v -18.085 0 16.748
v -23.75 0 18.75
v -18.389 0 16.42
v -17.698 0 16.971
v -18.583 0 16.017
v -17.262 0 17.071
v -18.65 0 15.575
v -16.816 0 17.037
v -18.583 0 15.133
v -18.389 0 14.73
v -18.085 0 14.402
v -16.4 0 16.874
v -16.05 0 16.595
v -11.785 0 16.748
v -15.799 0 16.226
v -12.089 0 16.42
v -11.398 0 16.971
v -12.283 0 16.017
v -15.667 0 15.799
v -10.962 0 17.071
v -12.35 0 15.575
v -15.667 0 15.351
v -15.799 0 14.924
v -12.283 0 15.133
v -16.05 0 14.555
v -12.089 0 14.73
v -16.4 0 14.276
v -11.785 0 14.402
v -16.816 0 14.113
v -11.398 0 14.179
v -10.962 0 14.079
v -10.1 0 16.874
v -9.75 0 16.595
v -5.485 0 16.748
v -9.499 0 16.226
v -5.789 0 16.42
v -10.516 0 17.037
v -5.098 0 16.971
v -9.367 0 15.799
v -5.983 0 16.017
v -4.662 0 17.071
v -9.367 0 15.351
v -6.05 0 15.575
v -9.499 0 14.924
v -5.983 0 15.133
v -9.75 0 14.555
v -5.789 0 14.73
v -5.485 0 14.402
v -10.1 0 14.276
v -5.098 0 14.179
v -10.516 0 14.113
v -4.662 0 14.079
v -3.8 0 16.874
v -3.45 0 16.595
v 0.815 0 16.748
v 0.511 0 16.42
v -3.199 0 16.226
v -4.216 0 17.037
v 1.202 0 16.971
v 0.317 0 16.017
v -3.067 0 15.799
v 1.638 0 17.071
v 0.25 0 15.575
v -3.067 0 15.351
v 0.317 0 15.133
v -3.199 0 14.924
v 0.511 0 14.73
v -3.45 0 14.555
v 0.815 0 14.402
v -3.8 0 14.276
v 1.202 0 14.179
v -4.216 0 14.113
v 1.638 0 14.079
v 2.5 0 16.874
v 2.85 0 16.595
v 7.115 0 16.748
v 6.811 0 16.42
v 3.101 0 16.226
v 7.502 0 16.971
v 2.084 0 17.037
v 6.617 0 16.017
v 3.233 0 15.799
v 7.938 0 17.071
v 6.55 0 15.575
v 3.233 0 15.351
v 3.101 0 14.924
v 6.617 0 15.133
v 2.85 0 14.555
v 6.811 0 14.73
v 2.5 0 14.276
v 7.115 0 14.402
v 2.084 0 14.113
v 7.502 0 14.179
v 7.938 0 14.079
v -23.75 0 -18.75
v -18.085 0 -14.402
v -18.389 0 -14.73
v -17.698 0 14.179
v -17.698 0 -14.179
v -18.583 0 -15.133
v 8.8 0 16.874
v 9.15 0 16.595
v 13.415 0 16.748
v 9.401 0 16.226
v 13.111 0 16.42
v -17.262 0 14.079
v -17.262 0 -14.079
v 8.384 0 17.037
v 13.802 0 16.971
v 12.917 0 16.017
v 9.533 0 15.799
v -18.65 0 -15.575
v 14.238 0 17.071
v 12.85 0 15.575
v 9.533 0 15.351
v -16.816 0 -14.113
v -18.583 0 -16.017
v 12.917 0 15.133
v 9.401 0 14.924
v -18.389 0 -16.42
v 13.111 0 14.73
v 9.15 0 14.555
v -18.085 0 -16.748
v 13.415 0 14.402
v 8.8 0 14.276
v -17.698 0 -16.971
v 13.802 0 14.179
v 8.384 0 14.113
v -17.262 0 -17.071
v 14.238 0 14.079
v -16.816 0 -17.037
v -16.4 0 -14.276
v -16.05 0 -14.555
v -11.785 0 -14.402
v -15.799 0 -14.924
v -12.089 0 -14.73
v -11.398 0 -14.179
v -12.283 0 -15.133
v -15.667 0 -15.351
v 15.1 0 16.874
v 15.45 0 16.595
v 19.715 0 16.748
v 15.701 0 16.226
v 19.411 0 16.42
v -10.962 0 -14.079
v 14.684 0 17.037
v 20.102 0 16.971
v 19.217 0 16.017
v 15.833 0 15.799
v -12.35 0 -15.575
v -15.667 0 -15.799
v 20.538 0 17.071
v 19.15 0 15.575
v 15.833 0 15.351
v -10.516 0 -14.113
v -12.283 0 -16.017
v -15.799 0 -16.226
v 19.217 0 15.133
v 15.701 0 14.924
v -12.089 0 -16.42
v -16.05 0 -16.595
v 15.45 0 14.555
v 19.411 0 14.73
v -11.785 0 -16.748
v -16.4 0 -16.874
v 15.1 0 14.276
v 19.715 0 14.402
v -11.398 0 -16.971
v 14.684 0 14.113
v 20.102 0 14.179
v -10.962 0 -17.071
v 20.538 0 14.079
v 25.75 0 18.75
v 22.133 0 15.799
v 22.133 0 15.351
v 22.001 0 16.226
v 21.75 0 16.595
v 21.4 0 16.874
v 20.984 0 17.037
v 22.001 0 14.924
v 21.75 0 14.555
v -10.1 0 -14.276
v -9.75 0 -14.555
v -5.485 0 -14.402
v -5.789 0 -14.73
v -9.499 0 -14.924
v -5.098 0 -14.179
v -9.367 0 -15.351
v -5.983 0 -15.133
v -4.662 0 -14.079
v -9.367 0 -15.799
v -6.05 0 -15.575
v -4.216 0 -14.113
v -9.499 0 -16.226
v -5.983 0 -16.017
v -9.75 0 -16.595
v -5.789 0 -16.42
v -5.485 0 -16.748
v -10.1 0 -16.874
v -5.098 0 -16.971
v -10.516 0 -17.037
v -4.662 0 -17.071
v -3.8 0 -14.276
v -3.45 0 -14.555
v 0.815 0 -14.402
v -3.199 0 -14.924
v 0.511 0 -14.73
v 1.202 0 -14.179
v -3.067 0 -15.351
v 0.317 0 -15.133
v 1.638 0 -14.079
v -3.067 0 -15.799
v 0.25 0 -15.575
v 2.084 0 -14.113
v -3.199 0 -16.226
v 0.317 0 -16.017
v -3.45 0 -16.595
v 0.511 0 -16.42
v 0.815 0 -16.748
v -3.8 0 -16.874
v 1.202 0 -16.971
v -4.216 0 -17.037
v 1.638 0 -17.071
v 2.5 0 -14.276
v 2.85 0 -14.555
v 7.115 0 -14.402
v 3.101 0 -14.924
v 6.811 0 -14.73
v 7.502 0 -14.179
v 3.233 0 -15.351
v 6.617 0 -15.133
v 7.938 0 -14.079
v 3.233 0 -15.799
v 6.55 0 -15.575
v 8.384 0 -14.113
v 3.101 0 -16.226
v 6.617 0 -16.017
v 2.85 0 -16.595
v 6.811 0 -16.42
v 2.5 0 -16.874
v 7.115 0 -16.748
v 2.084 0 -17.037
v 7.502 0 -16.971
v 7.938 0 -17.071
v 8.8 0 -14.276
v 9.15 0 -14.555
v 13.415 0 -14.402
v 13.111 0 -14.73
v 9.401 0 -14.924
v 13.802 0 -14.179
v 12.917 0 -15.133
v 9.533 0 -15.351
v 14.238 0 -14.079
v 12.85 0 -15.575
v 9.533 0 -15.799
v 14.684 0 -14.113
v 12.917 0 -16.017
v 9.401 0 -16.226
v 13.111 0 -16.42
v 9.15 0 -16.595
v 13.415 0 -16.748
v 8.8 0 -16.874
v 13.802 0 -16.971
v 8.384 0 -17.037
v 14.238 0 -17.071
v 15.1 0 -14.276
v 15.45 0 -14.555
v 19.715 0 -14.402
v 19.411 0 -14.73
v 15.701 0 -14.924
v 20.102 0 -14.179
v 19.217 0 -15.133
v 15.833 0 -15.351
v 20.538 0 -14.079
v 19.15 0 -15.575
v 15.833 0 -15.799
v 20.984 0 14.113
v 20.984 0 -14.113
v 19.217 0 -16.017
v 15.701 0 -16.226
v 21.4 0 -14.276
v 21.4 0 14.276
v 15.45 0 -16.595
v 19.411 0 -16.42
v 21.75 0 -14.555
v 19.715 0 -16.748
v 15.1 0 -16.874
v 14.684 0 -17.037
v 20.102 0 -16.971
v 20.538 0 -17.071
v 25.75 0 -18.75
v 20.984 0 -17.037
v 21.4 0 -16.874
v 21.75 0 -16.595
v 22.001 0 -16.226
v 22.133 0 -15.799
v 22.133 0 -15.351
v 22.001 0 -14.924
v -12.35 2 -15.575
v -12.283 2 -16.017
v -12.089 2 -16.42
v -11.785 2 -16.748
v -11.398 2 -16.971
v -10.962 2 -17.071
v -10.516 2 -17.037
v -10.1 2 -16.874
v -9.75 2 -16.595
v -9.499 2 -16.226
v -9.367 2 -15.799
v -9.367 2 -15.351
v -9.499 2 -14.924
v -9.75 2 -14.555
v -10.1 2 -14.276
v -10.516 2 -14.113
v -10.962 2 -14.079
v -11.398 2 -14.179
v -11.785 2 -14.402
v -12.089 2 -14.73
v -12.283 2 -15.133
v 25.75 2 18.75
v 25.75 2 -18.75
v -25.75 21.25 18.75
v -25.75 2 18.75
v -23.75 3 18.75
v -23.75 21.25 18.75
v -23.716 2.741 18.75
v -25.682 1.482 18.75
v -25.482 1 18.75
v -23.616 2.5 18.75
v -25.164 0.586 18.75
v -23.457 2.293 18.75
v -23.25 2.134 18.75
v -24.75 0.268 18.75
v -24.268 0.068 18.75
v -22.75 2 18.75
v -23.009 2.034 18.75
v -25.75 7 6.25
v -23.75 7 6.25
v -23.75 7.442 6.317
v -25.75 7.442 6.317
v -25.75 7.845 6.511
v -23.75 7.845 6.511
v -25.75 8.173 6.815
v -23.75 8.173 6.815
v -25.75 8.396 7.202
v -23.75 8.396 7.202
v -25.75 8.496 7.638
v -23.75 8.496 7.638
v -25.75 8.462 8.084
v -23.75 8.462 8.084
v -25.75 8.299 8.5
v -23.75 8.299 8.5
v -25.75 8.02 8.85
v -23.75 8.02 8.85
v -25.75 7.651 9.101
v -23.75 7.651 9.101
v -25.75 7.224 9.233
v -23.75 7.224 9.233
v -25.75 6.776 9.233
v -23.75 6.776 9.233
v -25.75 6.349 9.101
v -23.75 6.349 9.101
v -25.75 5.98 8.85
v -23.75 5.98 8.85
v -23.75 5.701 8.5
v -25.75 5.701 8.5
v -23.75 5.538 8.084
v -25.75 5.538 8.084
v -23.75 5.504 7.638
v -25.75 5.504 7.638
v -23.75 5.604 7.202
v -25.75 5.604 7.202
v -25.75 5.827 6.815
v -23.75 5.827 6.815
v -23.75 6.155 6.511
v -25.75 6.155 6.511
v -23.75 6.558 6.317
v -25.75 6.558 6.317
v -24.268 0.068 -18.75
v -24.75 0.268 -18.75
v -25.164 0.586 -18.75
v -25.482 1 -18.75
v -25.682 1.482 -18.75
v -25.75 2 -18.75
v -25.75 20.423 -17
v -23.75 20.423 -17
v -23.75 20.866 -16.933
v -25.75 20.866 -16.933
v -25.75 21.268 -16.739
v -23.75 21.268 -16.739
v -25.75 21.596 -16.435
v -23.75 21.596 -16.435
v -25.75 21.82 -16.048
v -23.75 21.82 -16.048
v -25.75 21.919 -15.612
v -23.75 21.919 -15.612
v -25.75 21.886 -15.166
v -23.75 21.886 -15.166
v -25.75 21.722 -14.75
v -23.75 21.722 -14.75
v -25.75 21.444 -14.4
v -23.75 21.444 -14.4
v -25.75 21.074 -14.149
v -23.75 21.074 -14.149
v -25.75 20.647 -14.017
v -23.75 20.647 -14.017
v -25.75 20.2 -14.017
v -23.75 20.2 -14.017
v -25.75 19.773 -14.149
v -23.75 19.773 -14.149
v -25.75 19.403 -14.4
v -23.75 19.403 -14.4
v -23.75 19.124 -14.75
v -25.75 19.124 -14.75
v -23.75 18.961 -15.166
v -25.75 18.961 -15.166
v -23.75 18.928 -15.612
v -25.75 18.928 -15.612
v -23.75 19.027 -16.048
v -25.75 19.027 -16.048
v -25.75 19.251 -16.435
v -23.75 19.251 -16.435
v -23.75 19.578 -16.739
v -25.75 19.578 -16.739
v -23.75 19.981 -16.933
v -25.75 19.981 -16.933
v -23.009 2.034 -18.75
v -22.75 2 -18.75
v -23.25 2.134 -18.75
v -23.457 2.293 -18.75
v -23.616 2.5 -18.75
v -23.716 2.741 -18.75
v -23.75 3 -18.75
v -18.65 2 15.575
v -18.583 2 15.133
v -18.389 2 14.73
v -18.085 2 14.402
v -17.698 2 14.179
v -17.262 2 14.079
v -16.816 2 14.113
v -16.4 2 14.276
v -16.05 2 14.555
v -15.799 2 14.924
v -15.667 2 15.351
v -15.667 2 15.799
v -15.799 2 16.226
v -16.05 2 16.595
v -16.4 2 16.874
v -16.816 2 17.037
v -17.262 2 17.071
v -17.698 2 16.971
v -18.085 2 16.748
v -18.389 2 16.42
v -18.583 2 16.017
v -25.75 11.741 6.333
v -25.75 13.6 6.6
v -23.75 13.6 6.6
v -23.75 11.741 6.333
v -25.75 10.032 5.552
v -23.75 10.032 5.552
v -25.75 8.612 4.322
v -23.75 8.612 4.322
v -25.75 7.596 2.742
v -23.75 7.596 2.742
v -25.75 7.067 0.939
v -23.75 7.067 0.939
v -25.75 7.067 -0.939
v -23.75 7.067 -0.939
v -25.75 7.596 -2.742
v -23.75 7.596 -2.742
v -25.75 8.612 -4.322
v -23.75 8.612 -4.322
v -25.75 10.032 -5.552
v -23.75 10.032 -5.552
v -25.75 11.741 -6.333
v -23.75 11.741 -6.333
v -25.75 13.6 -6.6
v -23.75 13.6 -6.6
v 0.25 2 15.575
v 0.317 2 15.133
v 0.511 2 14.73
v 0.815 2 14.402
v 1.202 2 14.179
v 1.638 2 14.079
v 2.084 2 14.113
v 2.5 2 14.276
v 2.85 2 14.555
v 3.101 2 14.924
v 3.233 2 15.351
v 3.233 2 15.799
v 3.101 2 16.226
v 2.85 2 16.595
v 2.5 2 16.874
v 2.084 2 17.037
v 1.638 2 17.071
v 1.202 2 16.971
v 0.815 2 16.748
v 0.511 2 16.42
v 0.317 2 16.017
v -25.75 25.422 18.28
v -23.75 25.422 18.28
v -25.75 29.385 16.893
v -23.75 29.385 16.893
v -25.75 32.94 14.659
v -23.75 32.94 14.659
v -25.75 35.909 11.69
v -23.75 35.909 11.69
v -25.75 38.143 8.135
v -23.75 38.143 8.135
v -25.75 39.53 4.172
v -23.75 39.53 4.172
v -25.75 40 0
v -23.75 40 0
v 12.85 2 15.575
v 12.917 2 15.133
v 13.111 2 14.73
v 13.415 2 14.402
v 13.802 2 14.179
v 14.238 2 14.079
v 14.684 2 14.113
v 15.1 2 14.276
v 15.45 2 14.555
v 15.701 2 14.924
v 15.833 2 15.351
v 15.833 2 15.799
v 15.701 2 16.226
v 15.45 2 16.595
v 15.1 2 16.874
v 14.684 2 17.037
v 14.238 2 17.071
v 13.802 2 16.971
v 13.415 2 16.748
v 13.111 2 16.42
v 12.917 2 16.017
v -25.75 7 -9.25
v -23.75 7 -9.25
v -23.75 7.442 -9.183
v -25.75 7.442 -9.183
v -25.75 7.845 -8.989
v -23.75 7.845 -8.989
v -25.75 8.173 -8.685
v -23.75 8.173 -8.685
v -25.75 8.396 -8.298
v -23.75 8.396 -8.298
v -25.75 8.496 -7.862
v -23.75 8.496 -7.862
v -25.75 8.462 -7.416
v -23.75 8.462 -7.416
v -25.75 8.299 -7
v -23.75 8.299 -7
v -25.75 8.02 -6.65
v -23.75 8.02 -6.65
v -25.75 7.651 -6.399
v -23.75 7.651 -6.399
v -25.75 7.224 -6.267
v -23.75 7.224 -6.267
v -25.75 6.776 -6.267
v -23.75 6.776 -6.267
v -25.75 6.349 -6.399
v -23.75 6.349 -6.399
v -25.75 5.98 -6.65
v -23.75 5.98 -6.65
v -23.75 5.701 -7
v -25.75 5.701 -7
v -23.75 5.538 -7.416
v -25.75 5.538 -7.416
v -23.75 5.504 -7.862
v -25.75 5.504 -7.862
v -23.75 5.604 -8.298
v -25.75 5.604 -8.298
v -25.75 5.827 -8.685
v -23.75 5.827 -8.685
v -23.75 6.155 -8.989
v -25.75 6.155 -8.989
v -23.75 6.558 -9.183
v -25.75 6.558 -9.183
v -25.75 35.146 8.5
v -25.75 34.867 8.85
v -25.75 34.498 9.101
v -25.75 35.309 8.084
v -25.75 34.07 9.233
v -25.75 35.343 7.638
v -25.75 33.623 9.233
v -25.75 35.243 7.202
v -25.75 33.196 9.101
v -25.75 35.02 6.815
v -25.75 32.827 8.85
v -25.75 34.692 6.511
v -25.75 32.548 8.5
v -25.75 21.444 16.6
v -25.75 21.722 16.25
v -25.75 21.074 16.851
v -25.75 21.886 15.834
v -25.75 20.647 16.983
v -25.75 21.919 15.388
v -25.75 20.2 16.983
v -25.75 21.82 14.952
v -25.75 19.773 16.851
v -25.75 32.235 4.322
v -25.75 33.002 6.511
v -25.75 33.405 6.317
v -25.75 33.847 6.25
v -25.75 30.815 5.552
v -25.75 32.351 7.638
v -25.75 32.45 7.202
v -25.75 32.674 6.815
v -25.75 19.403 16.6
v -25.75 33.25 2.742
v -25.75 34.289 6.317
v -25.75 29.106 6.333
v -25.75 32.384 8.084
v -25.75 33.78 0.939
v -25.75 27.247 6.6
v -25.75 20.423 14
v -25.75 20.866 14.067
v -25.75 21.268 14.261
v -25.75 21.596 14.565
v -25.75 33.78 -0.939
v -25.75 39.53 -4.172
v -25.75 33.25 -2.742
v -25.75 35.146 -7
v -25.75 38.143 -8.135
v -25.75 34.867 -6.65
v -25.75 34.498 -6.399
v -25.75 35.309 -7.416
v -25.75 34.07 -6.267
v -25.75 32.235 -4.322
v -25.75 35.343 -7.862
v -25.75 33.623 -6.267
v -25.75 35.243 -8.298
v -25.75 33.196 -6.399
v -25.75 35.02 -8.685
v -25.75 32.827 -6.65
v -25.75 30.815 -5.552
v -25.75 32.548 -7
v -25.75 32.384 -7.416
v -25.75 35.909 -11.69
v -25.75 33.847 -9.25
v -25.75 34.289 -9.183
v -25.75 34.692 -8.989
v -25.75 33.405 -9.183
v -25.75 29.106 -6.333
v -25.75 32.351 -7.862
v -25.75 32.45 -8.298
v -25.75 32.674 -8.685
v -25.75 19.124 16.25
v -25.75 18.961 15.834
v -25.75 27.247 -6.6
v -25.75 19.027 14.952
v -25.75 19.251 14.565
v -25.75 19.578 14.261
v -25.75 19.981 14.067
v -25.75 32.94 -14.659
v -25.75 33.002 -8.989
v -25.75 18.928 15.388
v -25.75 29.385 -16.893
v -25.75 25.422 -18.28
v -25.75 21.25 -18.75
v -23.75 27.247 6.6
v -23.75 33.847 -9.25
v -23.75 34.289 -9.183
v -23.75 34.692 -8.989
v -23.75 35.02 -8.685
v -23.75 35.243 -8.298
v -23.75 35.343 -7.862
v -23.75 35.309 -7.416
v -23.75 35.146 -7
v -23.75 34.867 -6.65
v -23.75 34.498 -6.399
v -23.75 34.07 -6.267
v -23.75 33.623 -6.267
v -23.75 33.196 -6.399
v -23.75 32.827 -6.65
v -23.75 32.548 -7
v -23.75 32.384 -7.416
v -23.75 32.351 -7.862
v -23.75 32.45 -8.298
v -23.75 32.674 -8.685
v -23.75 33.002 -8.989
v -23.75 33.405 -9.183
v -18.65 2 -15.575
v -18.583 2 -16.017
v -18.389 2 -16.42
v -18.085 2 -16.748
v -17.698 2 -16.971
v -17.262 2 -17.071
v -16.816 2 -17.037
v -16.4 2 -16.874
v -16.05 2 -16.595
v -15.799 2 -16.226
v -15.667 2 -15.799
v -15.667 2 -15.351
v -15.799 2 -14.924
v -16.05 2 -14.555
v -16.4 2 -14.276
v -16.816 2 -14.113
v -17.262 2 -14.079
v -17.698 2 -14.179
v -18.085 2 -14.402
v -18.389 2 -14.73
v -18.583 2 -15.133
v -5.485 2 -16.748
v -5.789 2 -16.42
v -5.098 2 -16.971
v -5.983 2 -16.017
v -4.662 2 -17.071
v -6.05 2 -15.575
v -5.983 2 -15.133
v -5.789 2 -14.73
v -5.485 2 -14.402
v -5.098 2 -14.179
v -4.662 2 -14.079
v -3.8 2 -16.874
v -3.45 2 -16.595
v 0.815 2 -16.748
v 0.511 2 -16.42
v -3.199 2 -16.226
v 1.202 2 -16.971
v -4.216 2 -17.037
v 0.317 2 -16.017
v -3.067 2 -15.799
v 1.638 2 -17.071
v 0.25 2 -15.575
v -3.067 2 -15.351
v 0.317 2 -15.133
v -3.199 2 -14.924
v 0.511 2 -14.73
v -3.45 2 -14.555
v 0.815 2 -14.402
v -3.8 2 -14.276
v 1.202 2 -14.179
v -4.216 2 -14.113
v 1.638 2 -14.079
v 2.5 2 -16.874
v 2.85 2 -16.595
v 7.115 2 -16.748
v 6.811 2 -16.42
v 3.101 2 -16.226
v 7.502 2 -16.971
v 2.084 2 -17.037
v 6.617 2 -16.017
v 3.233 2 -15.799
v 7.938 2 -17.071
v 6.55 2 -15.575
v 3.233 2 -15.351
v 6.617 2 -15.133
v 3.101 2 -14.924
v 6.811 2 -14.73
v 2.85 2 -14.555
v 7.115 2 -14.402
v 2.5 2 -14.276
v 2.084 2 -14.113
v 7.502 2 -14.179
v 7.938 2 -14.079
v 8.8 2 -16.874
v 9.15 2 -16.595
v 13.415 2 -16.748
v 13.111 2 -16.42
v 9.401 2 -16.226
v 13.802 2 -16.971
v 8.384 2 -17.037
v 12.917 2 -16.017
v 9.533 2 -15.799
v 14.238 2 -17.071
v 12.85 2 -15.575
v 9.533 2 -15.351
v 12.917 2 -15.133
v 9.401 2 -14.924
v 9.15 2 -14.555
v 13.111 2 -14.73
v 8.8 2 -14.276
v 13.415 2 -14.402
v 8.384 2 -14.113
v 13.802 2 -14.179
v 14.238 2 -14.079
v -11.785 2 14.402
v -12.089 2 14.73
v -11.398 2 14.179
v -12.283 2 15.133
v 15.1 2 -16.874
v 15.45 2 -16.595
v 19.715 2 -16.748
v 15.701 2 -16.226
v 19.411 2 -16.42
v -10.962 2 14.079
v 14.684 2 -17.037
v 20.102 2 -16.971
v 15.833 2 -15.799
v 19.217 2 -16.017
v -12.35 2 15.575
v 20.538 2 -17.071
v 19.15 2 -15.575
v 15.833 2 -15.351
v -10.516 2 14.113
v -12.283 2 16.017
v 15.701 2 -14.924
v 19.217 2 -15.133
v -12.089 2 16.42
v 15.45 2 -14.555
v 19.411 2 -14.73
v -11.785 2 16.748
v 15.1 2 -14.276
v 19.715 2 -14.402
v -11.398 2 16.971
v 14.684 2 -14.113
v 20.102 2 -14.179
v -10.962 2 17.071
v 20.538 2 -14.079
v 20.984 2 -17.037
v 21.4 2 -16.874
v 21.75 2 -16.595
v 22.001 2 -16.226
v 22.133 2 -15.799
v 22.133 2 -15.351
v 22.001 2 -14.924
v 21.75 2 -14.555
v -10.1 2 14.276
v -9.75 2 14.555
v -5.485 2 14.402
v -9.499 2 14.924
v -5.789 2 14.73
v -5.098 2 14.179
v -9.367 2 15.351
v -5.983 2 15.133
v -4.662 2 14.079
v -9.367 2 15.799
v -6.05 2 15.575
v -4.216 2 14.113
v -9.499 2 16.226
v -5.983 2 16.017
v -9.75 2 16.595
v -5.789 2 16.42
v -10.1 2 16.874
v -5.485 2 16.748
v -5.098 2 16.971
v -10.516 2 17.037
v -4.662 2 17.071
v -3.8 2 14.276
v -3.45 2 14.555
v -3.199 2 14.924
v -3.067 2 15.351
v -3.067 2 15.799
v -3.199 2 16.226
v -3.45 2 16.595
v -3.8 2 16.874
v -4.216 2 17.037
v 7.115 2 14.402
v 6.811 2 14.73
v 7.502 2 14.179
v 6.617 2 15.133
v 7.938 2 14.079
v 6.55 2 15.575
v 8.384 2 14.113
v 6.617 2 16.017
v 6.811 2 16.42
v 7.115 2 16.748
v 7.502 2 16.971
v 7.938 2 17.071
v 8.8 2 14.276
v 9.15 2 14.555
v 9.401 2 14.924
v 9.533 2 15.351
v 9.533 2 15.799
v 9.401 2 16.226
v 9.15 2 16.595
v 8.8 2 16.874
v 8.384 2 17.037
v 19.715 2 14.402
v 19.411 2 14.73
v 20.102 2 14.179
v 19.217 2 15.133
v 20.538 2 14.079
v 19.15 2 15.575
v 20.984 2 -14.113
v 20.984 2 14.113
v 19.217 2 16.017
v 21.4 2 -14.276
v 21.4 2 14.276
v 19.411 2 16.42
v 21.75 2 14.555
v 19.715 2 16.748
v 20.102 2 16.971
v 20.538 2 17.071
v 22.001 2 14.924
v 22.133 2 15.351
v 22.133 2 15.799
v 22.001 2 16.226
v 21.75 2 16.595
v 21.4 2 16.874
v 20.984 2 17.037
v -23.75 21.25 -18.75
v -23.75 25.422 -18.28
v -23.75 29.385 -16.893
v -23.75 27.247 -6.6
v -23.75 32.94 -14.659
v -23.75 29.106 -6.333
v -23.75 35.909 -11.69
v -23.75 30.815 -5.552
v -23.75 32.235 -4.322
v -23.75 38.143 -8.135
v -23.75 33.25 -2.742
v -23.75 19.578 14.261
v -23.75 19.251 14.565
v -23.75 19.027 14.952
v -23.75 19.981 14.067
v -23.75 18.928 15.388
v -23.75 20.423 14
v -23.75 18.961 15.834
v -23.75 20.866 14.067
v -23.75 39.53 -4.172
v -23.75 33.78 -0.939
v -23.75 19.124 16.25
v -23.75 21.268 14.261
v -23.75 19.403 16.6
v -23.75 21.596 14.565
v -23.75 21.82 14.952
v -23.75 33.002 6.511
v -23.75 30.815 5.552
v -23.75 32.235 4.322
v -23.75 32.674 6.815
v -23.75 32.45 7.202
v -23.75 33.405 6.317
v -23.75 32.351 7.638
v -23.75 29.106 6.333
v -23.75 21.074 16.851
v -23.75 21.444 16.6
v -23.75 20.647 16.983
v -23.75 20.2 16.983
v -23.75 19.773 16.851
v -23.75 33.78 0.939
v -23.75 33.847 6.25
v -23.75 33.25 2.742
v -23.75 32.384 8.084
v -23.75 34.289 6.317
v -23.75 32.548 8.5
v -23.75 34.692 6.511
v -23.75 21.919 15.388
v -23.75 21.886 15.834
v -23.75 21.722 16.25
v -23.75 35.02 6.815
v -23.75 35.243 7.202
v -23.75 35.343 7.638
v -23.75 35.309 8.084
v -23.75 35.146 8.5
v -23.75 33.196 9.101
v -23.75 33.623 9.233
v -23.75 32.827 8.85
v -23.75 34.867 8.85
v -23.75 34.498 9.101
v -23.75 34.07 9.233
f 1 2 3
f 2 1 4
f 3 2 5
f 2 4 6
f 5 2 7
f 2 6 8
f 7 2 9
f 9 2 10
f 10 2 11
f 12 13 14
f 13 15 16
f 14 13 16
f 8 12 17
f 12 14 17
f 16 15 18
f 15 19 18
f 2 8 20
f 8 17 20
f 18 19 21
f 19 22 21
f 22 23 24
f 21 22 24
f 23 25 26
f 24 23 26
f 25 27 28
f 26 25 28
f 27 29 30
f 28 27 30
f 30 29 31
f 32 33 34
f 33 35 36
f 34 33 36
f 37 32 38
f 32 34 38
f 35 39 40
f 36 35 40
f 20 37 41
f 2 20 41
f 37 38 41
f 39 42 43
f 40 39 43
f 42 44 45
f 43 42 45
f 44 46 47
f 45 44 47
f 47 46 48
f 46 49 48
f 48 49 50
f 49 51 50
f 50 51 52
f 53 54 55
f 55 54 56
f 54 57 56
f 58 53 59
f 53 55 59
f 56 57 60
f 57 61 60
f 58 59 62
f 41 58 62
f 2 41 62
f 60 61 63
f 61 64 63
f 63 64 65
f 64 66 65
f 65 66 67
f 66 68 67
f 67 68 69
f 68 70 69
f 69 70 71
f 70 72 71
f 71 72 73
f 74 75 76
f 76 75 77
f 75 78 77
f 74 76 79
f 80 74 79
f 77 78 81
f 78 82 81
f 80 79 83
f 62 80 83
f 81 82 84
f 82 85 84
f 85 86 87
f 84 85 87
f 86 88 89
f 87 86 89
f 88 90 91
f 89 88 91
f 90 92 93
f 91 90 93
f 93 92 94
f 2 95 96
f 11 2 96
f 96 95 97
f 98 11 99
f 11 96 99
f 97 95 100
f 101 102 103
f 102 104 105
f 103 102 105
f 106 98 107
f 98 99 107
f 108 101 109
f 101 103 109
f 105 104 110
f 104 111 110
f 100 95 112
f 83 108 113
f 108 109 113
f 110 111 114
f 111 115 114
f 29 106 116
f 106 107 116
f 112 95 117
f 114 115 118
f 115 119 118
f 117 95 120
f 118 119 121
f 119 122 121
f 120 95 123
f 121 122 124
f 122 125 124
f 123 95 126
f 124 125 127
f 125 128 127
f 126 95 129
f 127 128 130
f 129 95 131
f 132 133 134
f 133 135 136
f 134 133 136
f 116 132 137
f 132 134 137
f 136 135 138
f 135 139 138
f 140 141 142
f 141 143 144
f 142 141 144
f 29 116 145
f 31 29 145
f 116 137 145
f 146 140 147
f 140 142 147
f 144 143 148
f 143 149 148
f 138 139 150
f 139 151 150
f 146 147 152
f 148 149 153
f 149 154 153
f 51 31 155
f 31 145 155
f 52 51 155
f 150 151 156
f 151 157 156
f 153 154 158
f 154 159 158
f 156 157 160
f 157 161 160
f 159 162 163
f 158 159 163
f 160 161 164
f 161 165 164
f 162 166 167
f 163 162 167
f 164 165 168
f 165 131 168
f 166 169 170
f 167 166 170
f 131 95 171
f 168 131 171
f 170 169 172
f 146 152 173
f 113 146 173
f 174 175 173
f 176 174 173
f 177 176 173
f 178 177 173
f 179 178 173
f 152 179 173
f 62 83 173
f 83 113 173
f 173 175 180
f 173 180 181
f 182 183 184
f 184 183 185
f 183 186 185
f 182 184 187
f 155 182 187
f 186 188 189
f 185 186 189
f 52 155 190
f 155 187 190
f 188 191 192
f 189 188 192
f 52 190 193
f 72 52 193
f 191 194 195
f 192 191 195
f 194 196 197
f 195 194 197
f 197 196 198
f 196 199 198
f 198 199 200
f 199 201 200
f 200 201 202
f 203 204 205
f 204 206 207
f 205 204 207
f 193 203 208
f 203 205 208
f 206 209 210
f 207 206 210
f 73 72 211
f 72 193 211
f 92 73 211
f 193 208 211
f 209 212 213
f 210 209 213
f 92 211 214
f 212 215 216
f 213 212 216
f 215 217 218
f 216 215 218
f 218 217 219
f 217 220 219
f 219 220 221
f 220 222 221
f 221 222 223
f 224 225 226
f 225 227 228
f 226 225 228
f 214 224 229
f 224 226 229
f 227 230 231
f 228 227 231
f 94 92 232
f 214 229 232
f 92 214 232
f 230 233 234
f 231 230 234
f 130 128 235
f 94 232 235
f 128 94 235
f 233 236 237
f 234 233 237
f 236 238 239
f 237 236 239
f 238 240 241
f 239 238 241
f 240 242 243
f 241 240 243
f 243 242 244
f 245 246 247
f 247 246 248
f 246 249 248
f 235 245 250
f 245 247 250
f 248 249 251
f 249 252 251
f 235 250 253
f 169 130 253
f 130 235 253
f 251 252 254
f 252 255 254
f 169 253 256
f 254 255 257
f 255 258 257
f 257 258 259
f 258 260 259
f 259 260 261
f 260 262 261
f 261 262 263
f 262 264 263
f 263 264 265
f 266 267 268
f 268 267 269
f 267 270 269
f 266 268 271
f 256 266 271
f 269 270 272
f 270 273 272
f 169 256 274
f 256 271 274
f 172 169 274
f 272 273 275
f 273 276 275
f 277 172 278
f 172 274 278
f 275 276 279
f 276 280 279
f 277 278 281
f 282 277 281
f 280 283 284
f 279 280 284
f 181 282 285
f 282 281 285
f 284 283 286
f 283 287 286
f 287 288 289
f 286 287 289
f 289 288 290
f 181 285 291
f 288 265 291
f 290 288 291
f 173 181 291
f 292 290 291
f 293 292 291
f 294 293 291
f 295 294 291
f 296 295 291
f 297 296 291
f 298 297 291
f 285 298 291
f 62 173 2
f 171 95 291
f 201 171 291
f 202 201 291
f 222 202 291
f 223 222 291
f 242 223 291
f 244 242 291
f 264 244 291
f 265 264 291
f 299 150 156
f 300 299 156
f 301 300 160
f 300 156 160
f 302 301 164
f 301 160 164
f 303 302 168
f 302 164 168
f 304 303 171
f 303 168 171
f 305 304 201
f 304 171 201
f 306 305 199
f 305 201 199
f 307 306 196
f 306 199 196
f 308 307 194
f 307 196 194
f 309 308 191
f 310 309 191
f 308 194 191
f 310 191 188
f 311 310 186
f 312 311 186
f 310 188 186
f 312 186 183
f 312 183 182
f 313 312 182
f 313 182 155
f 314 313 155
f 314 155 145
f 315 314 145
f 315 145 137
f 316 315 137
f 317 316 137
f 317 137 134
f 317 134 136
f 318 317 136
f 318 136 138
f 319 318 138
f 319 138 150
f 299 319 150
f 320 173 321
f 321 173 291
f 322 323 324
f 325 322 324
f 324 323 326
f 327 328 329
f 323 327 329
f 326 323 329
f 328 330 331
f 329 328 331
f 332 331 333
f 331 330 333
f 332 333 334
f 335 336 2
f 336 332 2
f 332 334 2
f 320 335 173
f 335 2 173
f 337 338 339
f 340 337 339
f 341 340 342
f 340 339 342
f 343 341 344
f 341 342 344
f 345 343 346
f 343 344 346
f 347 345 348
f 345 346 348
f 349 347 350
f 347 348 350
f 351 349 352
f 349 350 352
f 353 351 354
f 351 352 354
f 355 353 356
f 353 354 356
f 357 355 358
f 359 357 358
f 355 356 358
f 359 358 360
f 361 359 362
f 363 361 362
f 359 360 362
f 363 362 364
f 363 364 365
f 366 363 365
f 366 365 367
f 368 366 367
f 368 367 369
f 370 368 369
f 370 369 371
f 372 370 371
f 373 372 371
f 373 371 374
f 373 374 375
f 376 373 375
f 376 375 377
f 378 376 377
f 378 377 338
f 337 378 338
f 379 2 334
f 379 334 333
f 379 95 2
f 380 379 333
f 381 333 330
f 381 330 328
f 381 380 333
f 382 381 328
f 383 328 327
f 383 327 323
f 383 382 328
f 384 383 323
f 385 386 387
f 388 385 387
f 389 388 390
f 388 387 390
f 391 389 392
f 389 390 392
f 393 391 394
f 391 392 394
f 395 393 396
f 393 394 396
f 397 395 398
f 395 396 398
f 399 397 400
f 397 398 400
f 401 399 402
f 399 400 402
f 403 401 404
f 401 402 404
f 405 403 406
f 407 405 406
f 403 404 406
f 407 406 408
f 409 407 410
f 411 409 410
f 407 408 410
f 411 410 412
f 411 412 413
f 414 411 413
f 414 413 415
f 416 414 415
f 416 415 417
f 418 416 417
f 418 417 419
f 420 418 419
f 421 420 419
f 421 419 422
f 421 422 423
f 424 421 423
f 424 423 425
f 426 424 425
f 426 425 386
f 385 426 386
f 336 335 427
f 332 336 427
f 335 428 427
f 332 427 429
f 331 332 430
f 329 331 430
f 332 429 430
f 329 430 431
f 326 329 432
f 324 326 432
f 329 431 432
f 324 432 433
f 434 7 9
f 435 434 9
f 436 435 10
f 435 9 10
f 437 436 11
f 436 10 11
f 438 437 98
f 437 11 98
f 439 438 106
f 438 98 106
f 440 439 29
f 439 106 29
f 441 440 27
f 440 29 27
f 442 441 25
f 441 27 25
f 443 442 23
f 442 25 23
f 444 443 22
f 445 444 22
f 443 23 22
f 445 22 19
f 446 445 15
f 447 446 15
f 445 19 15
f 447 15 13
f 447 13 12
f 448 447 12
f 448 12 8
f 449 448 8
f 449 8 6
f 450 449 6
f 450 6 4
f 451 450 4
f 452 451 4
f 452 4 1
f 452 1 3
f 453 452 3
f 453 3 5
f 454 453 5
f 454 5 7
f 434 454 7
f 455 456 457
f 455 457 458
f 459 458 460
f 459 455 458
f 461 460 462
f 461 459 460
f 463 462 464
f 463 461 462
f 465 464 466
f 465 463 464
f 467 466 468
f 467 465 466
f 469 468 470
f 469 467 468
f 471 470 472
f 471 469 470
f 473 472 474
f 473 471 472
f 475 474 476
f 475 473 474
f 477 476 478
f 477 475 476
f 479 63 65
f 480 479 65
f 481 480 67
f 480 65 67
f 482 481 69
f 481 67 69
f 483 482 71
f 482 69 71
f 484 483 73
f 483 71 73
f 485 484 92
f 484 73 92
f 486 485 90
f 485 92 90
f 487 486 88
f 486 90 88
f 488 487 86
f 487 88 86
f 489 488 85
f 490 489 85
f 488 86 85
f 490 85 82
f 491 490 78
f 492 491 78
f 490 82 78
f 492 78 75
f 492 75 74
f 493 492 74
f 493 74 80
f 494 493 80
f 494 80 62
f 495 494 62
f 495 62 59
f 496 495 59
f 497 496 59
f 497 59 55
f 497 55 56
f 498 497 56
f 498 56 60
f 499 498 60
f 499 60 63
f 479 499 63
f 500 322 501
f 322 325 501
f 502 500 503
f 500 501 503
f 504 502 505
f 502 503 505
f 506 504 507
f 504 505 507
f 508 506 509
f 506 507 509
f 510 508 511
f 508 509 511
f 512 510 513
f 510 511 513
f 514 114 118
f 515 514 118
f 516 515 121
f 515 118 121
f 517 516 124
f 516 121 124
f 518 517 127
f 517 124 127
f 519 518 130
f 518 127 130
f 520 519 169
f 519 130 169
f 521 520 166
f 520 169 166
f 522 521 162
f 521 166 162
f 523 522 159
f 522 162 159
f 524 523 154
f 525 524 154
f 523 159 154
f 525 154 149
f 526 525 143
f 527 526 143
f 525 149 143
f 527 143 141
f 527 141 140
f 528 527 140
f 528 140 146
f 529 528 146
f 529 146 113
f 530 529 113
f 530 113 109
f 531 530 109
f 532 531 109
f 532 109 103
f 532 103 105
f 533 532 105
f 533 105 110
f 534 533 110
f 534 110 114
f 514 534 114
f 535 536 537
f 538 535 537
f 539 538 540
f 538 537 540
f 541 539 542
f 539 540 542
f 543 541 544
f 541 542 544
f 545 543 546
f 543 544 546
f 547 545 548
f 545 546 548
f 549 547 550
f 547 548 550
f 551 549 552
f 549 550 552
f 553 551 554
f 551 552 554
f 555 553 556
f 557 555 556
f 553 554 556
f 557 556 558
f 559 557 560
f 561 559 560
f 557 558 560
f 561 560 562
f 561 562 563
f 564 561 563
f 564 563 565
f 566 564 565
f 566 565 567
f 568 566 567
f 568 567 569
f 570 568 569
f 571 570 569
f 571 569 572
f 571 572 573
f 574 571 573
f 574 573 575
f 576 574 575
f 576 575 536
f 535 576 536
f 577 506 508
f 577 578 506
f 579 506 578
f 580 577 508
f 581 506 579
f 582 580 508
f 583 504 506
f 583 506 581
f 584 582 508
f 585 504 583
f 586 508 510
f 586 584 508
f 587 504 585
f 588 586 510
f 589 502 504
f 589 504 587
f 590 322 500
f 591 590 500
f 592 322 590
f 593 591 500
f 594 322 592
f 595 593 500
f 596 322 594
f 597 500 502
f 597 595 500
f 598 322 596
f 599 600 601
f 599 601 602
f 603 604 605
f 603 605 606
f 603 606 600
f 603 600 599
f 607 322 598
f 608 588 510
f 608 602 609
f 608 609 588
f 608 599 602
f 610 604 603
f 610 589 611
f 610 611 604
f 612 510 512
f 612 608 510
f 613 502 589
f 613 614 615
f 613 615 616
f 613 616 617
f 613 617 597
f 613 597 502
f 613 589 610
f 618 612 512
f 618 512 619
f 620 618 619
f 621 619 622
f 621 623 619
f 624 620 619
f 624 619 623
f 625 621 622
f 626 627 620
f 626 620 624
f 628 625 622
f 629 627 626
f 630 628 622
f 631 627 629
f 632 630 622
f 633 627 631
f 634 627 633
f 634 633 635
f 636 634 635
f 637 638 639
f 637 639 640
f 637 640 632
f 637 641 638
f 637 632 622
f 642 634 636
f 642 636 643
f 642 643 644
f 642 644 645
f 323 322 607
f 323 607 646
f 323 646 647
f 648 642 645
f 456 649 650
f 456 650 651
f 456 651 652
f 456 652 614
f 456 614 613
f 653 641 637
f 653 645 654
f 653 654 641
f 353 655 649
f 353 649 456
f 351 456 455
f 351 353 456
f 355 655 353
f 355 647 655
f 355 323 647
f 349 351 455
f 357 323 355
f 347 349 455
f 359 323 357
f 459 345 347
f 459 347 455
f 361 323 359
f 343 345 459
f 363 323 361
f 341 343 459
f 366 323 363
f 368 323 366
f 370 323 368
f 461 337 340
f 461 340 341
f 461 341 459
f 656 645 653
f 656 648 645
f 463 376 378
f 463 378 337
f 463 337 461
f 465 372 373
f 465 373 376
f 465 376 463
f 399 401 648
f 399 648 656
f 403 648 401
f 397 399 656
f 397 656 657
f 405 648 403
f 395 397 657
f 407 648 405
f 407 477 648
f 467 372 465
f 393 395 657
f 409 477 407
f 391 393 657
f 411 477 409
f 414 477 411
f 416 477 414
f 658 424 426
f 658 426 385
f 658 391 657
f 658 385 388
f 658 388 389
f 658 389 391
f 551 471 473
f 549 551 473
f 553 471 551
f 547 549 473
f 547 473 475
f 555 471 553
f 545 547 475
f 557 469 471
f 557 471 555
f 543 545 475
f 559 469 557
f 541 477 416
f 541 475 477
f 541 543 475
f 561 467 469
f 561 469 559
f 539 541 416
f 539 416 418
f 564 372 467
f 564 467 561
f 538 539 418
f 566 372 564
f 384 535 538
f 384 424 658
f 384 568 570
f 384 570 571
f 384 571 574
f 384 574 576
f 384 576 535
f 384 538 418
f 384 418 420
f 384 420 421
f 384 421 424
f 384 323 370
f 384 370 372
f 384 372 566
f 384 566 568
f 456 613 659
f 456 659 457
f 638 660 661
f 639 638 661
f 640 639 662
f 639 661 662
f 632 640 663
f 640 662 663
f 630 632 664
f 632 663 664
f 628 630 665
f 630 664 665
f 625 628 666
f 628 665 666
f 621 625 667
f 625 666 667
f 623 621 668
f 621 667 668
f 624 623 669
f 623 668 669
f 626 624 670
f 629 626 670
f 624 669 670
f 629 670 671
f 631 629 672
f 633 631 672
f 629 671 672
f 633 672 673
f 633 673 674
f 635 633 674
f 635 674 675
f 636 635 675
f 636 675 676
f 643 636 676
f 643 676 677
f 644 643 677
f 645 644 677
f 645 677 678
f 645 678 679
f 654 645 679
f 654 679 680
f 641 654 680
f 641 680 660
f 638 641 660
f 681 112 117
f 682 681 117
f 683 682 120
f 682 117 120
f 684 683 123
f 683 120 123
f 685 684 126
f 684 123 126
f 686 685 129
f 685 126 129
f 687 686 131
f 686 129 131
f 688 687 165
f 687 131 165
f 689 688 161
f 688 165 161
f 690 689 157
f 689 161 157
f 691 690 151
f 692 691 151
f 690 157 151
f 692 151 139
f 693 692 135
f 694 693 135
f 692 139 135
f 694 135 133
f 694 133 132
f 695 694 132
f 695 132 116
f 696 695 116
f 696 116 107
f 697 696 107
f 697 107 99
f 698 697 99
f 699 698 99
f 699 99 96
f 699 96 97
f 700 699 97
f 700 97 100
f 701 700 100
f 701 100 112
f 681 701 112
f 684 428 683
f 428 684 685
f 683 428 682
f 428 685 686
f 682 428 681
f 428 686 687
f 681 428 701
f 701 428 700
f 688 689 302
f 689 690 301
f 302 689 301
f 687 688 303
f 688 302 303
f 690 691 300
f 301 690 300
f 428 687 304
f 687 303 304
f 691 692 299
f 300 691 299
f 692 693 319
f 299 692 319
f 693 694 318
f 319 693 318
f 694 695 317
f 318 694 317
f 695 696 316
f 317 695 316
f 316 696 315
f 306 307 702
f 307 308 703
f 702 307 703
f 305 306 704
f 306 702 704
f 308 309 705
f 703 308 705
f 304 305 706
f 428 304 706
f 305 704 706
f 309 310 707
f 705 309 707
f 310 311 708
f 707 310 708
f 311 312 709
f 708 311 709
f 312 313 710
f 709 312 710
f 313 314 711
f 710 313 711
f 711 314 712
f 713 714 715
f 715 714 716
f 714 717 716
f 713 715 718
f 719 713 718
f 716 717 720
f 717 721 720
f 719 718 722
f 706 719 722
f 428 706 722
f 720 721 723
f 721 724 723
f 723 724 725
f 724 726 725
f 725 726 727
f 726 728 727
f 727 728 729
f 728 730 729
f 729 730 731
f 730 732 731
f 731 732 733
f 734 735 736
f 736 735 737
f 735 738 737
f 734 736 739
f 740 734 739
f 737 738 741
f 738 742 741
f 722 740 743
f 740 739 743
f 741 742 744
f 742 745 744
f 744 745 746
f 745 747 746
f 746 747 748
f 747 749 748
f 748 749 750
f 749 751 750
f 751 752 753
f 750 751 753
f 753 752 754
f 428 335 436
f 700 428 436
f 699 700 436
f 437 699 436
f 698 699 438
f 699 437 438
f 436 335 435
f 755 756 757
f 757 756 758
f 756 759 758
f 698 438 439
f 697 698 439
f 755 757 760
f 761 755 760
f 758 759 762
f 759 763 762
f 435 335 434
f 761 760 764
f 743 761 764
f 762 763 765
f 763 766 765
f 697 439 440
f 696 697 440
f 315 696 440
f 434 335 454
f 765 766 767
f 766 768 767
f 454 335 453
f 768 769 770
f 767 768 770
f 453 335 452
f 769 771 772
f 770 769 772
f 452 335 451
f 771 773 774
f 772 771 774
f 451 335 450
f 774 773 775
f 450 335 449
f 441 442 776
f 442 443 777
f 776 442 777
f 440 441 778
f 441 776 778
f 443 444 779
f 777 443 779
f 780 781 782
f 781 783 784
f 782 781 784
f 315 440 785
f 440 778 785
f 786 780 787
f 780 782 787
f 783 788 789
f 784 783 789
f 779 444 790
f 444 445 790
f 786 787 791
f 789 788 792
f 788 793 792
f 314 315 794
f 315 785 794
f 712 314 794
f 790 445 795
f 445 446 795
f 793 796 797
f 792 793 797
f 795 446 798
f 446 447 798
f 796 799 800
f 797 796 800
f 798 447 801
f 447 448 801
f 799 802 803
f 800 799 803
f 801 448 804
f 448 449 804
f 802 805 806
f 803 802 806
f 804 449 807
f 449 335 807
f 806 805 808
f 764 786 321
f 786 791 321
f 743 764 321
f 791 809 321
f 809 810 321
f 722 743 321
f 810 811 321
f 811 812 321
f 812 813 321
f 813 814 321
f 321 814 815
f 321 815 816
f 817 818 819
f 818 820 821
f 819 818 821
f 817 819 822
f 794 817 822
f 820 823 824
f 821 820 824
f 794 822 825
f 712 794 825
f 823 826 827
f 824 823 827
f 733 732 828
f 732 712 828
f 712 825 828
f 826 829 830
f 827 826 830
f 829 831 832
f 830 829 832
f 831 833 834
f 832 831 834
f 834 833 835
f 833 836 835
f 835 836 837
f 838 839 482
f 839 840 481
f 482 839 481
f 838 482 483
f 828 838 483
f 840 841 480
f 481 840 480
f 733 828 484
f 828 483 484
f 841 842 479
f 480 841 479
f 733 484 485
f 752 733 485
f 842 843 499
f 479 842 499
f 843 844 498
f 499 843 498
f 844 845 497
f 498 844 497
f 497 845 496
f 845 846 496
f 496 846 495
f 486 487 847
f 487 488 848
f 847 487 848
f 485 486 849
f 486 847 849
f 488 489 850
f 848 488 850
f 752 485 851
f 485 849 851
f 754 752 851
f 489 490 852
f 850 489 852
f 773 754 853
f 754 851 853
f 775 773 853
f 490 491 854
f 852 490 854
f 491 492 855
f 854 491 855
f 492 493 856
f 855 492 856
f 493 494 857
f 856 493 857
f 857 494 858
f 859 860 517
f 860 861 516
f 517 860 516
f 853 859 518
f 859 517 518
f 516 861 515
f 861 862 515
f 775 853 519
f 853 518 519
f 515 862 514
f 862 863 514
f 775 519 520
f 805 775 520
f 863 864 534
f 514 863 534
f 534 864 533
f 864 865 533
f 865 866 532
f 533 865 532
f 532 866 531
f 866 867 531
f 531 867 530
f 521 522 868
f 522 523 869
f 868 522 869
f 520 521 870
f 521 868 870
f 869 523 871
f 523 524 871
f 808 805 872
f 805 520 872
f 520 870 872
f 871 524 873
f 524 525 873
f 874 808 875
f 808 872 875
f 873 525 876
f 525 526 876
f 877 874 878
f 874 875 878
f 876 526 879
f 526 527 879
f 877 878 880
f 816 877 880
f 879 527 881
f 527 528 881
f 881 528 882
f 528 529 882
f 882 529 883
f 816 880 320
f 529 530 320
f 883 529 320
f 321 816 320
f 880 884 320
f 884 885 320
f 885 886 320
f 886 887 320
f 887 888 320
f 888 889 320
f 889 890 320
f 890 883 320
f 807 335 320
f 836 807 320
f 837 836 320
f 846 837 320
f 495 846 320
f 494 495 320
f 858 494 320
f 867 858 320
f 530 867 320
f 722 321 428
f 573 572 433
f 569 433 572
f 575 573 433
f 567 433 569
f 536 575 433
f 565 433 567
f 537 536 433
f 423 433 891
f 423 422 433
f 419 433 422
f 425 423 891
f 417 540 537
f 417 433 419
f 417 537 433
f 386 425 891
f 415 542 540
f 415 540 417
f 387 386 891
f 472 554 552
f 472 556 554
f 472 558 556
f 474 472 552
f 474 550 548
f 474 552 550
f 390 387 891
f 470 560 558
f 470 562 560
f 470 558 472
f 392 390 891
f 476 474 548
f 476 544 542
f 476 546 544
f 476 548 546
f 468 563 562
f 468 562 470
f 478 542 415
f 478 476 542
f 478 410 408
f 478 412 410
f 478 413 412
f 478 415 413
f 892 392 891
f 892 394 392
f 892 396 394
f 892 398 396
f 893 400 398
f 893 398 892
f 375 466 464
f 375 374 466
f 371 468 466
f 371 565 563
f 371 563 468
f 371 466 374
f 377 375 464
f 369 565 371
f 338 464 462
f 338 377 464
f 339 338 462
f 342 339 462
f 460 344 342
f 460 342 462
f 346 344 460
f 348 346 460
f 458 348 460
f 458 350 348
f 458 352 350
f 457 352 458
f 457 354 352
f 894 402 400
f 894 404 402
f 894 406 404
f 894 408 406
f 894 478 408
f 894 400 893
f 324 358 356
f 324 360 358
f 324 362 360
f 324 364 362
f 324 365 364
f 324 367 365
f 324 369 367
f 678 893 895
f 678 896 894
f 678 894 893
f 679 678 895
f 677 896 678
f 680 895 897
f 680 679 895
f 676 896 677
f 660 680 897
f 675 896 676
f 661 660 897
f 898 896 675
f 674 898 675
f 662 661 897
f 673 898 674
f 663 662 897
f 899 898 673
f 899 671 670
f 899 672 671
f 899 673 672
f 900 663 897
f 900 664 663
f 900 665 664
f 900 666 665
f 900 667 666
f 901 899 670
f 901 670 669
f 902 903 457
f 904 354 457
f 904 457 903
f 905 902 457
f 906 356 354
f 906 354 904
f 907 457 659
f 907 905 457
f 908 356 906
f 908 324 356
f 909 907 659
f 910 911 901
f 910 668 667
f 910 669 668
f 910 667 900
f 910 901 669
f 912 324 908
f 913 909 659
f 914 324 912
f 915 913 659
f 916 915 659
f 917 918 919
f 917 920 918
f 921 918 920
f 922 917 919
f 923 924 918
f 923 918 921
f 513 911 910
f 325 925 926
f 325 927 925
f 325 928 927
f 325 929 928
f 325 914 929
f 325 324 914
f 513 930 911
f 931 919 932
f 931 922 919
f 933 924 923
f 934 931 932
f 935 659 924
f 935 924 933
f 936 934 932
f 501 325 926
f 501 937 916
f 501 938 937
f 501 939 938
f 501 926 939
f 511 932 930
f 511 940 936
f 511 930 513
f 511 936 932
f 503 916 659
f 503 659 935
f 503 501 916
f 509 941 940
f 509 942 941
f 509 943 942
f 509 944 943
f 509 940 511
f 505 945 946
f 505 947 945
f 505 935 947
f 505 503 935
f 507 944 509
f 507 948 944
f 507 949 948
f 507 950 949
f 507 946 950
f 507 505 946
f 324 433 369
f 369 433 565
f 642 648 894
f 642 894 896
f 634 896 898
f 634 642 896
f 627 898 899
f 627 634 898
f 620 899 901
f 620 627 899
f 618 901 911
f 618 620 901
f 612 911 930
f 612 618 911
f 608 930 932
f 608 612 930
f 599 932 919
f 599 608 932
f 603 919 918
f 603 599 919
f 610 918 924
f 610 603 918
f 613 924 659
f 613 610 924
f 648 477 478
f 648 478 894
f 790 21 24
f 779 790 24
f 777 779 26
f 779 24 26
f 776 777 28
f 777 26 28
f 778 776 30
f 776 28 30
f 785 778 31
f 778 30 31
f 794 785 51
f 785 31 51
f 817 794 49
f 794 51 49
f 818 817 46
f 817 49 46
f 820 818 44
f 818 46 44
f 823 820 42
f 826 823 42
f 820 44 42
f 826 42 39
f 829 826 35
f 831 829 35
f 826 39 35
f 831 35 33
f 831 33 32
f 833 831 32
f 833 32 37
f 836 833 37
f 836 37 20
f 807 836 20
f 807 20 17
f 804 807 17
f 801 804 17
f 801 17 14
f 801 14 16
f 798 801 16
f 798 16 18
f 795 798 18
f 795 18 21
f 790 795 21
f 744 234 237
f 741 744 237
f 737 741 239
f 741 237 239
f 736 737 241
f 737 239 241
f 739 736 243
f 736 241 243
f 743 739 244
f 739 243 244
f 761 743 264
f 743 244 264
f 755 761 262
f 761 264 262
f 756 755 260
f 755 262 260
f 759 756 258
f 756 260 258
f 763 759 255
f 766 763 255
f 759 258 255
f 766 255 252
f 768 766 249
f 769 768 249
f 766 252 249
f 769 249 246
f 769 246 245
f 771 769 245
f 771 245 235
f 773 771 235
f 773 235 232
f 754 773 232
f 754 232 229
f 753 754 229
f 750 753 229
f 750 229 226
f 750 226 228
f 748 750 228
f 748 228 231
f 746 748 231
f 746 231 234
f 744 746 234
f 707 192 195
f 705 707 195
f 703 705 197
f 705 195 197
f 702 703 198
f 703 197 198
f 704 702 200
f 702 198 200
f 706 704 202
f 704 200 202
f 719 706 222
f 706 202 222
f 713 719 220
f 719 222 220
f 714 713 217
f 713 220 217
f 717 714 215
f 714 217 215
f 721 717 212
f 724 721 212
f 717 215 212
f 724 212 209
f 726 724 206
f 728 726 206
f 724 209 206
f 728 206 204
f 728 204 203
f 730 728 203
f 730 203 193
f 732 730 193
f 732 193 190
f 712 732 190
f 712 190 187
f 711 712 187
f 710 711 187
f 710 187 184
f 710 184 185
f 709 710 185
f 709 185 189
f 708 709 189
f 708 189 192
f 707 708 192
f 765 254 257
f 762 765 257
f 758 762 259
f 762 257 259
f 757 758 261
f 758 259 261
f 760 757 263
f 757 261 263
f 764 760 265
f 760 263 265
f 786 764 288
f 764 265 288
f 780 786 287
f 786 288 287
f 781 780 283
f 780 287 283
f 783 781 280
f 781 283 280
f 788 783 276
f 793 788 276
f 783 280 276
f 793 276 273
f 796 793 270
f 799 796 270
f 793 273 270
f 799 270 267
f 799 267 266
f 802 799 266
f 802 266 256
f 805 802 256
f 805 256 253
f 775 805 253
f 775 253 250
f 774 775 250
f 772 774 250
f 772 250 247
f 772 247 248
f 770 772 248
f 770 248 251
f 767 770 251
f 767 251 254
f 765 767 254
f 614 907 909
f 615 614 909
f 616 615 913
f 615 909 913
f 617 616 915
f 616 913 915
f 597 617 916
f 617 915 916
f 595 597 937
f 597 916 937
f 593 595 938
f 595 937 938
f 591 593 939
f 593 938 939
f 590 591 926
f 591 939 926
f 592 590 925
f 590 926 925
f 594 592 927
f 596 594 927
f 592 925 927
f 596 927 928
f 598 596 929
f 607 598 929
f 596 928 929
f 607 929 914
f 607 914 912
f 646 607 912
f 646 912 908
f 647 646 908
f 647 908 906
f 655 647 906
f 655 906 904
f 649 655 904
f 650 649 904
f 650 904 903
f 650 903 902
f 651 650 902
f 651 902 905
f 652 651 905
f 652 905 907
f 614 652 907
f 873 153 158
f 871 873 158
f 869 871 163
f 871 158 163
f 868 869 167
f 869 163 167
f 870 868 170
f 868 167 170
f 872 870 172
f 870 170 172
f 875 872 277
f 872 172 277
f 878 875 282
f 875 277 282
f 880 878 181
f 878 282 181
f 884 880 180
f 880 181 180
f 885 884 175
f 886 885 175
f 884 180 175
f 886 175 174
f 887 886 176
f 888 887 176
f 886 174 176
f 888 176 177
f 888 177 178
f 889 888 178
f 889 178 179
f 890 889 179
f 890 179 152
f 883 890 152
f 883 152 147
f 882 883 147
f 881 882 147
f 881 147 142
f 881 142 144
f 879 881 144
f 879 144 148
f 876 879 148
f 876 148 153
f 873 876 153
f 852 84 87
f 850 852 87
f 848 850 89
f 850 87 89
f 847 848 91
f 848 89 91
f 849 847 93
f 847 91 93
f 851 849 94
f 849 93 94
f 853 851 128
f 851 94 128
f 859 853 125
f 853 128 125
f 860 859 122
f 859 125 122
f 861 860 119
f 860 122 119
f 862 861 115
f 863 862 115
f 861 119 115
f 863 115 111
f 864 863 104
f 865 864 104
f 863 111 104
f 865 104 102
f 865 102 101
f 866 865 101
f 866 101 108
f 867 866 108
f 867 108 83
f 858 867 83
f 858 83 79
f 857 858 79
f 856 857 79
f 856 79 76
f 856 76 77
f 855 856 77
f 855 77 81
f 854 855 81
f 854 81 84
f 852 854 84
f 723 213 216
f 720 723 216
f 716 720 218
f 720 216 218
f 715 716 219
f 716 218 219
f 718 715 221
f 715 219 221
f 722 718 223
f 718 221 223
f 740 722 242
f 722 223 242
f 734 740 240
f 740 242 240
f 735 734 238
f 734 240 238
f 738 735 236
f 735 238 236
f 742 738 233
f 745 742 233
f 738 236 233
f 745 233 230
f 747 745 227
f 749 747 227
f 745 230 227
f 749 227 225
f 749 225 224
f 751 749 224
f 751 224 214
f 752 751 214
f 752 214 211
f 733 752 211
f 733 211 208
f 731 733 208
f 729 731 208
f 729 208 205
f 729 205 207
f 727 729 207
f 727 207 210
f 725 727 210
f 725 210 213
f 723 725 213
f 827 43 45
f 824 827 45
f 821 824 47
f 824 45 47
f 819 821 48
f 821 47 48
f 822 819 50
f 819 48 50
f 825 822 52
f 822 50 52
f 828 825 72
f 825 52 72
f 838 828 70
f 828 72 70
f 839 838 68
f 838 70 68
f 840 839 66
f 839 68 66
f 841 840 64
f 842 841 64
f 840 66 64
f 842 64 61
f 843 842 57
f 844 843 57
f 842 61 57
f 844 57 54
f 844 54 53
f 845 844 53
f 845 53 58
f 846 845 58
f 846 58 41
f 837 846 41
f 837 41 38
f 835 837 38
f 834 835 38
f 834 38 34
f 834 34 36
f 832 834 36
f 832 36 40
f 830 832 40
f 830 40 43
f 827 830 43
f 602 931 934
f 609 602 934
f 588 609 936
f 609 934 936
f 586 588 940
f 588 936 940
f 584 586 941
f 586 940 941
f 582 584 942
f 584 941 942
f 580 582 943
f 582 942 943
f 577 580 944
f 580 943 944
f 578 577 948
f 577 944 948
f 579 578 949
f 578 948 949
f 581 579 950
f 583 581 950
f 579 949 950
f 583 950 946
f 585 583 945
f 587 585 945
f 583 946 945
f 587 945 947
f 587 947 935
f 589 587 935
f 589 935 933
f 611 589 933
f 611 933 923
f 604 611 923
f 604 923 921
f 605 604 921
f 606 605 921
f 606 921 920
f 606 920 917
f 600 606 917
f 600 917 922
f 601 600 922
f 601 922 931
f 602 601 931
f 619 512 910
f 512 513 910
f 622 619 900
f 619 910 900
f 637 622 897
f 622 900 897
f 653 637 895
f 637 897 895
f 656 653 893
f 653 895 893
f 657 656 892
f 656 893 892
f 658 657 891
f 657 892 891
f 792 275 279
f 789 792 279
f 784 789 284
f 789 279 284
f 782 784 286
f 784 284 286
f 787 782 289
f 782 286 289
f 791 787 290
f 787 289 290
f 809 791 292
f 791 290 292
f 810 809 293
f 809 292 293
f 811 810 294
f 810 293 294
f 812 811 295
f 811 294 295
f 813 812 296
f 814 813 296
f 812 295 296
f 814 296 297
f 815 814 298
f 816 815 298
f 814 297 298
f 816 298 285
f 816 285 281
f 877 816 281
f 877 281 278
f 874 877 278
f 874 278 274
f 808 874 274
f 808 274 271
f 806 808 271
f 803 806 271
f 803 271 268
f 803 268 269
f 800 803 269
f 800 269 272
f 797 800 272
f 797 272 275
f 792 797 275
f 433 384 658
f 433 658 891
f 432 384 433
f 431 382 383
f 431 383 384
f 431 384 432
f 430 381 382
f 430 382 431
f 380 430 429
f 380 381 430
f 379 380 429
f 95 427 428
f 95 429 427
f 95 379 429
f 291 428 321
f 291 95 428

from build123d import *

# Parameters (mm, degrees)
SKETCH1_W             = 51.5
SKETCH1_H             = 37.5
BOSS_EXTRUDE1_DEPTH   = 40
SKETCH2_W             = 49.5
SKETCH2_H             = 38
CUT_EXTRUDE1_DEPTH    = 61.574850392
FILLET1_R             = 1
FILLET2_R             = 2
F_3_0MM_DOWEL_HOLE1_D = 3
CUT_EXTRUDE2_DEPTH    = 10
FILLET3_R             = 18.75
F_3_0MM_DOWEL_HOLE2_D = 3


with BuildPart() as part:
    # Sketch1 → Boss-Extrude1 (new body)
    with BuildSketch(Plane(origin=(0, 0, 0), x_dir=(1, 0, 0), z_dir=(0, 1, 0))):
        Rectangle(SKETCH1_W, SKETCH1_H)
    extrude(amount=BOSS_EXTRUDE1_DEPTH)

    # Sketch2 → Cut-Extrude1 (cut, through all)
    with BuildSketch(Plane.XY.offset(18.75)):
        with Locations((1, 21)):
            Rectangle(SKETCH2_W, SKETCH2_H)
    extrude(amount=-CUT_EXTRUDE1_DEPTH, mode=Mode.SUBTRACT)

    # Fillet1
    fillet1_edges = [part.edges().sort_by_distance(p)[0] for p in [
        (-23.75, 2, 0),
    ]]
    fillet(fillet1_edges, radius=FILLET1_R)

    # Fillet2
    fillet2_edges = [part.edges().sort_by_distance(p)[0] for p in [
        (-25.75, 0, 0),
    ]]
    fillet(fillet2_edges, radius=FILLET2_R)

    # Ø3.0mm Dowel Hole1 (through all)
    with Locations(Plane(origin=(0, 2, 0), x_dir=(1, 0, 0), z_dir=(0, 1, 0))):
        with Locations((-17.15, -15.575), (-17.15, 15.575), (-10.85, -15.575), (-4.55, -15.575), (1.75, -15.575), (8.05, -15.575), (14.35, -15.575), (20.65, -15.575), (20.65, 15.575), (14.35, 15.575), (8.05, 15.575), (1.75, 15.575), (-4.55, 15.575), (-10.85, 15.575)):
            Hole(F_3_0MM_DOWEL_HOLE1_D / 2)

    # Sketch7 → Cut-Extrude2 (cut)
    with BuildSketch(Plane.ZY.offset(25.75)):
        with BuildLine():
            Line((6.6, 27.246787517), (6.6, 13.6))
            ThreePointArc((6.6, 13.6), (0, 7), (-6.6, 13.6))
            Line((-6.6, 13.6), (-6.6, 27.246787517))
            ThreePointArc((-6.6, 27.246787517), (0, 33.846787517), (6.6, 27.246787517))
        make_face()
    extrude(amount=-CUT_EXTRUDE2_DEPTH, mode=Mode.SUBTRACT)

    # Fillet3
    fillet3_edges = [part.edges().sort_by_distance(p)[0] for p in [
        (-24.75, 40, 18.75),
        (-24.75, 40, -18.75),
    ]]
    fillet(fillet3_edges, radius=FILLET3_R - 0.0001)  # a hair under: the kernel refuses the full size

    # Ø3.0mm Dowel Hole2 (through all)
    with Locations(Plane.ZY.offset(25.75)):
        with Locations((-7.75, 33.846787517), (7.75, 33.846787517), (15.5, 20.423393759), (7.75, 7), (-7.75, 7), (-15.5, 20.423393759)):
            Hole(F_3_0MM_DOWEL_HOLE2_D / 2)


solid = part.part
